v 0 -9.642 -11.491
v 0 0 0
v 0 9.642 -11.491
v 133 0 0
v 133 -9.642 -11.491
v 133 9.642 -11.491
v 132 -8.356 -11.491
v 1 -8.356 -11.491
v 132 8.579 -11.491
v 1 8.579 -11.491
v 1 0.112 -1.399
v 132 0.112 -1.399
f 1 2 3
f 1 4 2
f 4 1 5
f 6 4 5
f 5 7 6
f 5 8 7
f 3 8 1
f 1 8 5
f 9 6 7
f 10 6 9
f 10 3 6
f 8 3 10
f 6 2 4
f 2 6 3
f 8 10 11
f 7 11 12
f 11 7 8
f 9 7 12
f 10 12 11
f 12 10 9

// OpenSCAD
rotate([0, 90, 0]) rotate([0, 0, -40])
difference() {
  linear_extrude(height=133)
    polygon([
      [0, 0],
      [15, 0],
      [15*sin(10), 15*cos(10)]]
    );
  translate([1, 1*cos(10), 1]) linear_extrude(height=131)
    polygon([
      [0, 0],
      [14, 0],
      [14*sin(10), 14*cos(10)]]
    );
}
